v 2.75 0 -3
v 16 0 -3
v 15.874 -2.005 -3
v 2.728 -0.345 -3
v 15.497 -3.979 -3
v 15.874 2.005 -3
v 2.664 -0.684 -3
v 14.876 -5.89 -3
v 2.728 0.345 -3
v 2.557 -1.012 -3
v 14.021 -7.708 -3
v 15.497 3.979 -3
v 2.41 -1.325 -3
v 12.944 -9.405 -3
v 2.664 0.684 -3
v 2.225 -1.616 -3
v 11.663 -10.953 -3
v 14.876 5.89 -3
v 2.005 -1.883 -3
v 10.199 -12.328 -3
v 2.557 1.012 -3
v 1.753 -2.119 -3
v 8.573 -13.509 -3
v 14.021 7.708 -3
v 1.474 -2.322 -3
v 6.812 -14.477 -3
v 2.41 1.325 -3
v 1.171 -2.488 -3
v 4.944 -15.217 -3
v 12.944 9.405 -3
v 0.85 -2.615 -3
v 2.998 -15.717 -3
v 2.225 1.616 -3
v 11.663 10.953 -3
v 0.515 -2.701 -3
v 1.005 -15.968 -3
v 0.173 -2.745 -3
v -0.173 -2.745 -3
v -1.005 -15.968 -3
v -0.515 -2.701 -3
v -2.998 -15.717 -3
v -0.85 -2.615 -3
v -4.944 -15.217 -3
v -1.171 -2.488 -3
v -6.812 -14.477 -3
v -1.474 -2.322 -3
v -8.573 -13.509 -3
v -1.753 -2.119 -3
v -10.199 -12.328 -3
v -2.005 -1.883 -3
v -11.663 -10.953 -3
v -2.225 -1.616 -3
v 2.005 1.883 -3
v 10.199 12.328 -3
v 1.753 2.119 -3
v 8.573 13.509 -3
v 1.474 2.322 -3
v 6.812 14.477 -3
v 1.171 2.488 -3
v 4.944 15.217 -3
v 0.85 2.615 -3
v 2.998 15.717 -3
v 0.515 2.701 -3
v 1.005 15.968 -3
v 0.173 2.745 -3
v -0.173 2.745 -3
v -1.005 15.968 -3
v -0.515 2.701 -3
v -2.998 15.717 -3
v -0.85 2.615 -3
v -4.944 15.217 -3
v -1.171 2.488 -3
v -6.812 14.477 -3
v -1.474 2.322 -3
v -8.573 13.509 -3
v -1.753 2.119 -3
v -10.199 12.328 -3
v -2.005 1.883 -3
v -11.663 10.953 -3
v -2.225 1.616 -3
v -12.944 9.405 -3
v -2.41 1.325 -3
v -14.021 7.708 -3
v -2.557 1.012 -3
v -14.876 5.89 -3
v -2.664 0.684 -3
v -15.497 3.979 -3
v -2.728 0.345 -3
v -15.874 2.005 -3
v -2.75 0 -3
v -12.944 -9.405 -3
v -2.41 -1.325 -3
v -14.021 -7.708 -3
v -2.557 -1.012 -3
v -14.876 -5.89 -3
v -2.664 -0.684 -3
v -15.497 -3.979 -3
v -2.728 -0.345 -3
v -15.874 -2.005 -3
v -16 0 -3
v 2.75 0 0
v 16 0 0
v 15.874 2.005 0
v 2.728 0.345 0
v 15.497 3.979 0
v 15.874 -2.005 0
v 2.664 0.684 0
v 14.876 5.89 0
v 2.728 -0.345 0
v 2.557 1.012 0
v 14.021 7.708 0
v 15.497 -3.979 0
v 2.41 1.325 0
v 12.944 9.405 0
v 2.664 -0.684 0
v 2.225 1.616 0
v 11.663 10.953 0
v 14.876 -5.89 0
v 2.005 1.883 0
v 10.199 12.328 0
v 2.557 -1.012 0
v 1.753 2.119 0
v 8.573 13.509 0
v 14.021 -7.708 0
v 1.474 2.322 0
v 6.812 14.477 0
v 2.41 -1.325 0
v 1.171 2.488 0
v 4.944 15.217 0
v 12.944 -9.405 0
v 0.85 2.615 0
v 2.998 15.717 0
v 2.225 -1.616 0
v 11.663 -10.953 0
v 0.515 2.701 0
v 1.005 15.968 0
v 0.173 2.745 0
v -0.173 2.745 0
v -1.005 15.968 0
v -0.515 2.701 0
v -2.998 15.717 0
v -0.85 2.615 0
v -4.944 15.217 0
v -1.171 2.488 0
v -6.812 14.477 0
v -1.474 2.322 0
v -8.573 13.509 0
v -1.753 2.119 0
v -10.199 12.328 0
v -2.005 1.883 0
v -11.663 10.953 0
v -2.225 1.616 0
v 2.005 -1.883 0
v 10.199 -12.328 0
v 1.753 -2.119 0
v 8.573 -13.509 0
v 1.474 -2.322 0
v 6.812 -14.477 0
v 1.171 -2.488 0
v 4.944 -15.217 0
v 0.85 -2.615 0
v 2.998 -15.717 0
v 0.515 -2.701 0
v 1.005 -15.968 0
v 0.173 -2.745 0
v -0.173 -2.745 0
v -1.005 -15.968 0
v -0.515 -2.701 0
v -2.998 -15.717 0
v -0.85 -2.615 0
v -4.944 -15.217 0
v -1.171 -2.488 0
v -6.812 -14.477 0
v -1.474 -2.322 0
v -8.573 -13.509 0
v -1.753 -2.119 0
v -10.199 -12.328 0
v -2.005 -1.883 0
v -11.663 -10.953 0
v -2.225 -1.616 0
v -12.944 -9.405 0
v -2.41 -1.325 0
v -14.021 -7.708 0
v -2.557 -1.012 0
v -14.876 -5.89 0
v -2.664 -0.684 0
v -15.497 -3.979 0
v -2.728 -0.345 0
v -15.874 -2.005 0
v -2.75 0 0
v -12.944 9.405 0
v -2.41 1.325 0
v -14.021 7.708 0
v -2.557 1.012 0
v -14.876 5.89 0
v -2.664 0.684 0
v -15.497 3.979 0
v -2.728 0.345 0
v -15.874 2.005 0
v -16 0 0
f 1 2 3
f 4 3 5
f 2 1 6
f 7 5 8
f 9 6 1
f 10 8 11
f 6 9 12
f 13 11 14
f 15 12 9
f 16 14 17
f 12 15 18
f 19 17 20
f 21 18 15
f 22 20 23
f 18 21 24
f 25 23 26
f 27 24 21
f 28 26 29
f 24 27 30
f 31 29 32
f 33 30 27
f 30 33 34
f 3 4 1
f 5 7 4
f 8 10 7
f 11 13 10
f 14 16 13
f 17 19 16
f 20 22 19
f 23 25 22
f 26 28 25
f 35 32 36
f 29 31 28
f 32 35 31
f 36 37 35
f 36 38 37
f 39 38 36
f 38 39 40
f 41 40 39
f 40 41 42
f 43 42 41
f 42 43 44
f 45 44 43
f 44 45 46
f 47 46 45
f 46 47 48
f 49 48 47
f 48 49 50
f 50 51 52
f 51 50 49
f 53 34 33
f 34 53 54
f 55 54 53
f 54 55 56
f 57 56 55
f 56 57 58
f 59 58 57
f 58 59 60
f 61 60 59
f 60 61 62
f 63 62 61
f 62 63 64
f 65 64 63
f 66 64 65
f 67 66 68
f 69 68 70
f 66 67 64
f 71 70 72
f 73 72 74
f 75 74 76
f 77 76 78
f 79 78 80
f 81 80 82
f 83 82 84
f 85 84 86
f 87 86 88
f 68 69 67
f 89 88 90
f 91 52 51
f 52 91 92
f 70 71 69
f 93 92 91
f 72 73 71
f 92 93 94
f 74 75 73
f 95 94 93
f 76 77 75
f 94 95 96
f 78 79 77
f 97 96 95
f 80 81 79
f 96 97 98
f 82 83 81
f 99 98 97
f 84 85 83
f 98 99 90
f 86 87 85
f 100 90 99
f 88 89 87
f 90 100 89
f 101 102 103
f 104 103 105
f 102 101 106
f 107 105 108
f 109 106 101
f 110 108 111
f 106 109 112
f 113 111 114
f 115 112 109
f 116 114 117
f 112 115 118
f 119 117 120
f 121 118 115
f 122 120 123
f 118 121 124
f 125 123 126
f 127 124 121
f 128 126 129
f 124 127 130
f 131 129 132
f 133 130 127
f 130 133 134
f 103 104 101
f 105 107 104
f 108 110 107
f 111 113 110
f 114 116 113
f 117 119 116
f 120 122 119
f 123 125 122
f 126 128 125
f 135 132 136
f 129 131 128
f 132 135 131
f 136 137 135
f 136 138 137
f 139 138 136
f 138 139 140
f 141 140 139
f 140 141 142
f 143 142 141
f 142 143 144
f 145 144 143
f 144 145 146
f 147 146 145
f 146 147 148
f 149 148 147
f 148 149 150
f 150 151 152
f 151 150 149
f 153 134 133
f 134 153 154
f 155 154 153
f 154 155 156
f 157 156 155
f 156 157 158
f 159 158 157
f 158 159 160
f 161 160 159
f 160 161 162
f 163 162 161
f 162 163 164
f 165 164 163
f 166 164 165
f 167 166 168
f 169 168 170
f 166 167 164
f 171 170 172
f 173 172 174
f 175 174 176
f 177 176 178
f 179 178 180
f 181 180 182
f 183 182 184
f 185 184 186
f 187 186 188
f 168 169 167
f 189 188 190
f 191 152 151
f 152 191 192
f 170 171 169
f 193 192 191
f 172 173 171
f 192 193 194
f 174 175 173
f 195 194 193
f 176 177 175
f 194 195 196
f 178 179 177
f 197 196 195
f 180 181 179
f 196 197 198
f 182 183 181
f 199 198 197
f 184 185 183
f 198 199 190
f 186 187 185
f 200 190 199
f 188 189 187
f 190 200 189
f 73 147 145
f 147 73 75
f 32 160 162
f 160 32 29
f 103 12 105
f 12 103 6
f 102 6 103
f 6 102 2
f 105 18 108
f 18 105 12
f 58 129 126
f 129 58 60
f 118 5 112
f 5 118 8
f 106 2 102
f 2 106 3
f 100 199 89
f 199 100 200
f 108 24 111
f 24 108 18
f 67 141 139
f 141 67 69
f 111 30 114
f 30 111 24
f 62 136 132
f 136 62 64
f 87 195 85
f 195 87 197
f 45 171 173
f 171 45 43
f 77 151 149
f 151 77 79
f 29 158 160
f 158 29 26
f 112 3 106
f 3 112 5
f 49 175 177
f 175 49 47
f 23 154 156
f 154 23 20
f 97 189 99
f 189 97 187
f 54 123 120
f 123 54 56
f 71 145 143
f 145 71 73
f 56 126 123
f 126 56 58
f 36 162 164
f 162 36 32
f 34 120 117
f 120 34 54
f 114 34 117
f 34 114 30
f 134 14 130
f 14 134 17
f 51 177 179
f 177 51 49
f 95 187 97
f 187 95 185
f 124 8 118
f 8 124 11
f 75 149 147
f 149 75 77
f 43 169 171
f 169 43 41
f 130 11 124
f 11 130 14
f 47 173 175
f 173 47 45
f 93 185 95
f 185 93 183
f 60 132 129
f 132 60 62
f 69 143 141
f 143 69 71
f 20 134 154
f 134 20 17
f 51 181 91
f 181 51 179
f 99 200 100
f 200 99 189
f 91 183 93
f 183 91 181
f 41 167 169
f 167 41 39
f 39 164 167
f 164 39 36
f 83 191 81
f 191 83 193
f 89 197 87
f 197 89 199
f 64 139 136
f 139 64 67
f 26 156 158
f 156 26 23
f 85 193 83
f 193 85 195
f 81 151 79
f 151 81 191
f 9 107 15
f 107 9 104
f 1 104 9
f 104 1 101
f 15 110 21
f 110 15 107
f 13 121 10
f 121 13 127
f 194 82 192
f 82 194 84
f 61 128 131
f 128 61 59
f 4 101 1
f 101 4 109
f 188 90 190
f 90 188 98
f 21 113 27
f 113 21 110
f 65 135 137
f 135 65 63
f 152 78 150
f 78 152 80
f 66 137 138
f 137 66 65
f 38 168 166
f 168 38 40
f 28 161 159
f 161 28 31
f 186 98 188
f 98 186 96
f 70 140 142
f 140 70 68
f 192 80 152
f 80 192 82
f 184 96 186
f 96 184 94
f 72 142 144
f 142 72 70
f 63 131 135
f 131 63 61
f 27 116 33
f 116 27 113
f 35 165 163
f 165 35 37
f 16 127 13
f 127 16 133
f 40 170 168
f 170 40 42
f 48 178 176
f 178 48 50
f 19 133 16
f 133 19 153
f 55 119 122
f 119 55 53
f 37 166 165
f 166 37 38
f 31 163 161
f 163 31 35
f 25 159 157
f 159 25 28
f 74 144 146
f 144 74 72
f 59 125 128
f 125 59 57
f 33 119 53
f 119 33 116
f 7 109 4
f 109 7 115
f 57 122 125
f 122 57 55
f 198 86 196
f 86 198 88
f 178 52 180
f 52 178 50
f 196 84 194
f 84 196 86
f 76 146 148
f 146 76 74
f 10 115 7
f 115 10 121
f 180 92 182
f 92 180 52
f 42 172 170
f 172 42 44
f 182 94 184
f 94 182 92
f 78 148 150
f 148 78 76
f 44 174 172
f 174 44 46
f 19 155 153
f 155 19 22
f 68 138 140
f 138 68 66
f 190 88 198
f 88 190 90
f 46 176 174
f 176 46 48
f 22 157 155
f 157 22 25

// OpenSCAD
$fn = 50;


difference() {
	union() {
		translate(v = [0, 0, -3.0000000000]) {
			cylinder(h = 3, r = 7.0000000000);
		}
		translate(v = [0, 0, -3.0000000000]) {
			cylinder(h = 3, r = 16.0000000000);
		}
	}
	union() {
		#translate(v = [0, 0, -3]) {
			cylinder(h = 3, r = 2.7500000000);
		}
	}
}
